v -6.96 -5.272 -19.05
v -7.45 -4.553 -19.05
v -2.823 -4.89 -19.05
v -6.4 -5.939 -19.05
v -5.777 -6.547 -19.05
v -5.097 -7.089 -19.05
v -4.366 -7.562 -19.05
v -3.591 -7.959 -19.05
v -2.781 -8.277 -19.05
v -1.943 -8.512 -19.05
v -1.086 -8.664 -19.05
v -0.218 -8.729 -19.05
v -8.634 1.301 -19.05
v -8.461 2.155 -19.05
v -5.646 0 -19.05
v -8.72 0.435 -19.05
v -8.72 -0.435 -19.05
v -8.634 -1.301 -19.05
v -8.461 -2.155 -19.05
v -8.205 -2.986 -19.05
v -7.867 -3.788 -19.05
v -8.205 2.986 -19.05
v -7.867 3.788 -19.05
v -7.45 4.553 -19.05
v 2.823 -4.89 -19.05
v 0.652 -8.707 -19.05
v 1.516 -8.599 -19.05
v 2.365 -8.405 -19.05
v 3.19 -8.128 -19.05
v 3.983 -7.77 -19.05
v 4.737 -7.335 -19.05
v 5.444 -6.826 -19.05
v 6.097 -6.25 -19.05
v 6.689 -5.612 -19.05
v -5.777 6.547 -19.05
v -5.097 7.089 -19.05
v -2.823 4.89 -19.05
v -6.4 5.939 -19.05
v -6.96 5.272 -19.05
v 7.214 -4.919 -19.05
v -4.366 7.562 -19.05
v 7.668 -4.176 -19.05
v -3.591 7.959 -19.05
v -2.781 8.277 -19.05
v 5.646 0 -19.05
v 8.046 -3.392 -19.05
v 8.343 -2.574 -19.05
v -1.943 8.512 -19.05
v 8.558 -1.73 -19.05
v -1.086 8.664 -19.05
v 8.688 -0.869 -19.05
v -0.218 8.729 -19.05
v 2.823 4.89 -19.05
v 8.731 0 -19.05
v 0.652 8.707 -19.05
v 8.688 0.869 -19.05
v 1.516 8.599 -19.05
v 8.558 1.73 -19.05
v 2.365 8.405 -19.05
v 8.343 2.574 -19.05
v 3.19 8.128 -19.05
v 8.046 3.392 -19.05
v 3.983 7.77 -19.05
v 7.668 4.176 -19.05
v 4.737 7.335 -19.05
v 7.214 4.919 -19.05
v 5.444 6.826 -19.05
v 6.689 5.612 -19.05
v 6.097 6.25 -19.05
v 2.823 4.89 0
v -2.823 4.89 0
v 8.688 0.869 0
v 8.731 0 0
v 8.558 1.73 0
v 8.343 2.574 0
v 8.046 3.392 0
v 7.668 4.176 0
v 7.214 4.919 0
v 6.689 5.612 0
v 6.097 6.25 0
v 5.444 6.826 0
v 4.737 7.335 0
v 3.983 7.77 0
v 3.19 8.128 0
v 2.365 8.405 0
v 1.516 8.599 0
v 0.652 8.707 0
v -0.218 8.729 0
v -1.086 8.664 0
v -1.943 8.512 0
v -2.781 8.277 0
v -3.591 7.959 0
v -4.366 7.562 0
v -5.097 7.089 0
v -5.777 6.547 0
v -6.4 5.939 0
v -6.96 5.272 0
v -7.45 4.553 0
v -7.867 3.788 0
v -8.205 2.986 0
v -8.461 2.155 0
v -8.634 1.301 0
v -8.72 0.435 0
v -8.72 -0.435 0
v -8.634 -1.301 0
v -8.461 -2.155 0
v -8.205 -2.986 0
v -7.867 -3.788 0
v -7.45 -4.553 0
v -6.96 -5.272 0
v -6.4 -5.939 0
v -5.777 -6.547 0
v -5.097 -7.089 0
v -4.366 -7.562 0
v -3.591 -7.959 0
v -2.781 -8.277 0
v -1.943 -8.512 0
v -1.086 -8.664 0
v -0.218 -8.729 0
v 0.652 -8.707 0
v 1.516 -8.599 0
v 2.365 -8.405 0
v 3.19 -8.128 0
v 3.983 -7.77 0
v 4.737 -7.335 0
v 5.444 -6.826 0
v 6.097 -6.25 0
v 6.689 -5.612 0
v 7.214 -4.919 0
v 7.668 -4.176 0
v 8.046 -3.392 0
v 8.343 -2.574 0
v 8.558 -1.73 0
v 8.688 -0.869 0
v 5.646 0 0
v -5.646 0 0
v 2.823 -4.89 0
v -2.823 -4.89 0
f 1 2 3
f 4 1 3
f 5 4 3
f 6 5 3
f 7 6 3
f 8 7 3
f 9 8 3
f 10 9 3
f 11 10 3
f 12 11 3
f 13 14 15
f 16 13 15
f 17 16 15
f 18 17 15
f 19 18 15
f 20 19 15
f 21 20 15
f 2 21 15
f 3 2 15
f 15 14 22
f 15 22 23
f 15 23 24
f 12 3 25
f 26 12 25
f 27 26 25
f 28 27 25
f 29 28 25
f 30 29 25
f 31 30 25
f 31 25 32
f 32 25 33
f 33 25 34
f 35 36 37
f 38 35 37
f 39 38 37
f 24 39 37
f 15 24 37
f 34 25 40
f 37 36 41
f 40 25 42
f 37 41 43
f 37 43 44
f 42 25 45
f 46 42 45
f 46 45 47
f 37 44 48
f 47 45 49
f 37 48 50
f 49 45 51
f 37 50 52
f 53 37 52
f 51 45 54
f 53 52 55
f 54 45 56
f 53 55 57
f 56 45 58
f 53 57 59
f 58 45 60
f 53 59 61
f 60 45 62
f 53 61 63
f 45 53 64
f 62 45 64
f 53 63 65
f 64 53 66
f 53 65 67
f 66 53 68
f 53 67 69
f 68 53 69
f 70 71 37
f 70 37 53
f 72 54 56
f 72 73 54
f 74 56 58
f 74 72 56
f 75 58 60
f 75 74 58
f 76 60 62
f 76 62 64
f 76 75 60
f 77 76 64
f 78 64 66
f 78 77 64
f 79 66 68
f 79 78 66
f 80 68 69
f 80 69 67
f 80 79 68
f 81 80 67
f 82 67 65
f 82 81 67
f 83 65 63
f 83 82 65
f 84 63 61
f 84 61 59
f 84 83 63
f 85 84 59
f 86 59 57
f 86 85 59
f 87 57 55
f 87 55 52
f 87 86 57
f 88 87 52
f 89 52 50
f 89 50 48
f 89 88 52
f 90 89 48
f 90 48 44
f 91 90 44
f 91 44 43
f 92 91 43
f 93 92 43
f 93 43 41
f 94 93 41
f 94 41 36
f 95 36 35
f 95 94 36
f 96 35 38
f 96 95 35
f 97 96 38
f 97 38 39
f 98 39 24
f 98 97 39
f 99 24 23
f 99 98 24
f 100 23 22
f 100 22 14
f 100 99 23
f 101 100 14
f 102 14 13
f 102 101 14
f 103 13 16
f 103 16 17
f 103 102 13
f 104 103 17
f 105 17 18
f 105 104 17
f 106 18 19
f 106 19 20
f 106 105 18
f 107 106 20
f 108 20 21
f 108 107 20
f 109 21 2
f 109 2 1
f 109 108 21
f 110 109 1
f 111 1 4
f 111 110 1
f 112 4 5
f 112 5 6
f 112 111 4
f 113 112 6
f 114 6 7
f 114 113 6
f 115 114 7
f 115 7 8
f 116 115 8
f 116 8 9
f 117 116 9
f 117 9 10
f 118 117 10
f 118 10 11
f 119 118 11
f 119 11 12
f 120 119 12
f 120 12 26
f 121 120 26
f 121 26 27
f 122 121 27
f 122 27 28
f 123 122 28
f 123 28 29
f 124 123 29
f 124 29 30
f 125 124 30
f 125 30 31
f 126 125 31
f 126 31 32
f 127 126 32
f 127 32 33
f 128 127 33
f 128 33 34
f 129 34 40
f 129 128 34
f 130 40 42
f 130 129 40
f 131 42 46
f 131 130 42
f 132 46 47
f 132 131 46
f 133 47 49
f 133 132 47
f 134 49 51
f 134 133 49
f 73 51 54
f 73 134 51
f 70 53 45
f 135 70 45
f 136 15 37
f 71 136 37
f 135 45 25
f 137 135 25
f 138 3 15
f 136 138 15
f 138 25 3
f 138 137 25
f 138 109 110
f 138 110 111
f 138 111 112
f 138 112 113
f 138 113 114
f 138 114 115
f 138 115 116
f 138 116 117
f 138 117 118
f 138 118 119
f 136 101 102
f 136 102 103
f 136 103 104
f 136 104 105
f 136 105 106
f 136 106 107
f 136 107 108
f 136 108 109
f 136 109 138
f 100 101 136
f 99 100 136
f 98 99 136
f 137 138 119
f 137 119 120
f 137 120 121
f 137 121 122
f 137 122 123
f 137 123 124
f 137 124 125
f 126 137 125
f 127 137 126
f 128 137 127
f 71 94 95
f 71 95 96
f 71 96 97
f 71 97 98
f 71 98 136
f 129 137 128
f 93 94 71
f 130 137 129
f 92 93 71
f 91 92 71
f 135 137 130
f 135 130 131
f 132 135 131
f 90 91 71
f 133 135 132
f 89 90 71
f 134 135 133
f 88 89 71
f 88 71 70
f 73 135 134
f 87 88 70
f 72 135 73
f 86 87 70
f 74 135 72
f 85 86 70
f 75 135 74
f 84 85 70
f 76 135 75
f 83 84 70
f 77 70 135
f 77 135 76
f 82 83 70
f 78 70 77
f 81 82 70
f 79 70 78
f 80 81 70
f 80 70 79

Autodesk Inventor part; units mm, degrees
ref_plane "YZ Plane" through (0, 0, 0) normal (1, 0, 0) x (0, 1, 0)
ref_plane "XZ Plane" through (0, 0, 0) normal (0, 1, 0) x (-1, 0, 0)
ref_plane "XY Plane" through (0, 0, 0) normal (0, 0, 1) x (1, 0, 0)
sketch "Sketch1" plane through (0, 0, 0) normal (0, 0, 1) x (1, 0, 0)
  line L0 (2.7496, 4.7625) -> (5.4993, 0)
  line L1 (5.4993, 0) -> (2.7496, -4.7625)
  line L2 (2.7496, -4.7625) -> (-2.7496, -4.7625)
  line L3 (-2.7496, -4.7625) -> (-5.4993, 0)
  line L4 (-5.4993, 0) -> (-2.7496, 4.7625)
  line L5 (-2.7496, 4.7625) -> (2.7496, 4.7625)
  circle A0 centre (0, 0) radius 8.7313
  circle A1 centre (0, 0) radius 5.4993 construction
  dimension "d0" = 9.525
  dimension "d2" = 17.4625
  dimension "d3" = 3.232
extrude "Extrusion1" add sketch "Sketch1" against normal blind 19.05
thicken "Thicken Hex" operation add thickness 0.127 both sides no extend neighbours yes toward (-0.8660254, 0.5, 0) faces at (-4.5827, 1.5875, -6.35) (-3.6662, -3.175, -6.35) (0.9165, -4.7625, -6.35) (-0.9165, 4.7625, -6.35) (3.6662, 3.175, -6.35) (4.5827, -1.5875, -6.35)
equation "\"d0\" = hexSize"
equation "\"d2\" = exteriorDiameter"
equation "\"d4\" = length"
equation "\"d6\" = printSpacing"
equation "\"d7\" = printSpacing"
equation "\"hexSize\" = 9.525"
equation "\"exteriorDiameter\" = 17.4625"
equation "\"length\" = 19.05"
equation "\"printSpacing\" = 0.127"
properties part number "3_8x11_16x3_4-hexBearing" material "PC/ABS Plastic"
